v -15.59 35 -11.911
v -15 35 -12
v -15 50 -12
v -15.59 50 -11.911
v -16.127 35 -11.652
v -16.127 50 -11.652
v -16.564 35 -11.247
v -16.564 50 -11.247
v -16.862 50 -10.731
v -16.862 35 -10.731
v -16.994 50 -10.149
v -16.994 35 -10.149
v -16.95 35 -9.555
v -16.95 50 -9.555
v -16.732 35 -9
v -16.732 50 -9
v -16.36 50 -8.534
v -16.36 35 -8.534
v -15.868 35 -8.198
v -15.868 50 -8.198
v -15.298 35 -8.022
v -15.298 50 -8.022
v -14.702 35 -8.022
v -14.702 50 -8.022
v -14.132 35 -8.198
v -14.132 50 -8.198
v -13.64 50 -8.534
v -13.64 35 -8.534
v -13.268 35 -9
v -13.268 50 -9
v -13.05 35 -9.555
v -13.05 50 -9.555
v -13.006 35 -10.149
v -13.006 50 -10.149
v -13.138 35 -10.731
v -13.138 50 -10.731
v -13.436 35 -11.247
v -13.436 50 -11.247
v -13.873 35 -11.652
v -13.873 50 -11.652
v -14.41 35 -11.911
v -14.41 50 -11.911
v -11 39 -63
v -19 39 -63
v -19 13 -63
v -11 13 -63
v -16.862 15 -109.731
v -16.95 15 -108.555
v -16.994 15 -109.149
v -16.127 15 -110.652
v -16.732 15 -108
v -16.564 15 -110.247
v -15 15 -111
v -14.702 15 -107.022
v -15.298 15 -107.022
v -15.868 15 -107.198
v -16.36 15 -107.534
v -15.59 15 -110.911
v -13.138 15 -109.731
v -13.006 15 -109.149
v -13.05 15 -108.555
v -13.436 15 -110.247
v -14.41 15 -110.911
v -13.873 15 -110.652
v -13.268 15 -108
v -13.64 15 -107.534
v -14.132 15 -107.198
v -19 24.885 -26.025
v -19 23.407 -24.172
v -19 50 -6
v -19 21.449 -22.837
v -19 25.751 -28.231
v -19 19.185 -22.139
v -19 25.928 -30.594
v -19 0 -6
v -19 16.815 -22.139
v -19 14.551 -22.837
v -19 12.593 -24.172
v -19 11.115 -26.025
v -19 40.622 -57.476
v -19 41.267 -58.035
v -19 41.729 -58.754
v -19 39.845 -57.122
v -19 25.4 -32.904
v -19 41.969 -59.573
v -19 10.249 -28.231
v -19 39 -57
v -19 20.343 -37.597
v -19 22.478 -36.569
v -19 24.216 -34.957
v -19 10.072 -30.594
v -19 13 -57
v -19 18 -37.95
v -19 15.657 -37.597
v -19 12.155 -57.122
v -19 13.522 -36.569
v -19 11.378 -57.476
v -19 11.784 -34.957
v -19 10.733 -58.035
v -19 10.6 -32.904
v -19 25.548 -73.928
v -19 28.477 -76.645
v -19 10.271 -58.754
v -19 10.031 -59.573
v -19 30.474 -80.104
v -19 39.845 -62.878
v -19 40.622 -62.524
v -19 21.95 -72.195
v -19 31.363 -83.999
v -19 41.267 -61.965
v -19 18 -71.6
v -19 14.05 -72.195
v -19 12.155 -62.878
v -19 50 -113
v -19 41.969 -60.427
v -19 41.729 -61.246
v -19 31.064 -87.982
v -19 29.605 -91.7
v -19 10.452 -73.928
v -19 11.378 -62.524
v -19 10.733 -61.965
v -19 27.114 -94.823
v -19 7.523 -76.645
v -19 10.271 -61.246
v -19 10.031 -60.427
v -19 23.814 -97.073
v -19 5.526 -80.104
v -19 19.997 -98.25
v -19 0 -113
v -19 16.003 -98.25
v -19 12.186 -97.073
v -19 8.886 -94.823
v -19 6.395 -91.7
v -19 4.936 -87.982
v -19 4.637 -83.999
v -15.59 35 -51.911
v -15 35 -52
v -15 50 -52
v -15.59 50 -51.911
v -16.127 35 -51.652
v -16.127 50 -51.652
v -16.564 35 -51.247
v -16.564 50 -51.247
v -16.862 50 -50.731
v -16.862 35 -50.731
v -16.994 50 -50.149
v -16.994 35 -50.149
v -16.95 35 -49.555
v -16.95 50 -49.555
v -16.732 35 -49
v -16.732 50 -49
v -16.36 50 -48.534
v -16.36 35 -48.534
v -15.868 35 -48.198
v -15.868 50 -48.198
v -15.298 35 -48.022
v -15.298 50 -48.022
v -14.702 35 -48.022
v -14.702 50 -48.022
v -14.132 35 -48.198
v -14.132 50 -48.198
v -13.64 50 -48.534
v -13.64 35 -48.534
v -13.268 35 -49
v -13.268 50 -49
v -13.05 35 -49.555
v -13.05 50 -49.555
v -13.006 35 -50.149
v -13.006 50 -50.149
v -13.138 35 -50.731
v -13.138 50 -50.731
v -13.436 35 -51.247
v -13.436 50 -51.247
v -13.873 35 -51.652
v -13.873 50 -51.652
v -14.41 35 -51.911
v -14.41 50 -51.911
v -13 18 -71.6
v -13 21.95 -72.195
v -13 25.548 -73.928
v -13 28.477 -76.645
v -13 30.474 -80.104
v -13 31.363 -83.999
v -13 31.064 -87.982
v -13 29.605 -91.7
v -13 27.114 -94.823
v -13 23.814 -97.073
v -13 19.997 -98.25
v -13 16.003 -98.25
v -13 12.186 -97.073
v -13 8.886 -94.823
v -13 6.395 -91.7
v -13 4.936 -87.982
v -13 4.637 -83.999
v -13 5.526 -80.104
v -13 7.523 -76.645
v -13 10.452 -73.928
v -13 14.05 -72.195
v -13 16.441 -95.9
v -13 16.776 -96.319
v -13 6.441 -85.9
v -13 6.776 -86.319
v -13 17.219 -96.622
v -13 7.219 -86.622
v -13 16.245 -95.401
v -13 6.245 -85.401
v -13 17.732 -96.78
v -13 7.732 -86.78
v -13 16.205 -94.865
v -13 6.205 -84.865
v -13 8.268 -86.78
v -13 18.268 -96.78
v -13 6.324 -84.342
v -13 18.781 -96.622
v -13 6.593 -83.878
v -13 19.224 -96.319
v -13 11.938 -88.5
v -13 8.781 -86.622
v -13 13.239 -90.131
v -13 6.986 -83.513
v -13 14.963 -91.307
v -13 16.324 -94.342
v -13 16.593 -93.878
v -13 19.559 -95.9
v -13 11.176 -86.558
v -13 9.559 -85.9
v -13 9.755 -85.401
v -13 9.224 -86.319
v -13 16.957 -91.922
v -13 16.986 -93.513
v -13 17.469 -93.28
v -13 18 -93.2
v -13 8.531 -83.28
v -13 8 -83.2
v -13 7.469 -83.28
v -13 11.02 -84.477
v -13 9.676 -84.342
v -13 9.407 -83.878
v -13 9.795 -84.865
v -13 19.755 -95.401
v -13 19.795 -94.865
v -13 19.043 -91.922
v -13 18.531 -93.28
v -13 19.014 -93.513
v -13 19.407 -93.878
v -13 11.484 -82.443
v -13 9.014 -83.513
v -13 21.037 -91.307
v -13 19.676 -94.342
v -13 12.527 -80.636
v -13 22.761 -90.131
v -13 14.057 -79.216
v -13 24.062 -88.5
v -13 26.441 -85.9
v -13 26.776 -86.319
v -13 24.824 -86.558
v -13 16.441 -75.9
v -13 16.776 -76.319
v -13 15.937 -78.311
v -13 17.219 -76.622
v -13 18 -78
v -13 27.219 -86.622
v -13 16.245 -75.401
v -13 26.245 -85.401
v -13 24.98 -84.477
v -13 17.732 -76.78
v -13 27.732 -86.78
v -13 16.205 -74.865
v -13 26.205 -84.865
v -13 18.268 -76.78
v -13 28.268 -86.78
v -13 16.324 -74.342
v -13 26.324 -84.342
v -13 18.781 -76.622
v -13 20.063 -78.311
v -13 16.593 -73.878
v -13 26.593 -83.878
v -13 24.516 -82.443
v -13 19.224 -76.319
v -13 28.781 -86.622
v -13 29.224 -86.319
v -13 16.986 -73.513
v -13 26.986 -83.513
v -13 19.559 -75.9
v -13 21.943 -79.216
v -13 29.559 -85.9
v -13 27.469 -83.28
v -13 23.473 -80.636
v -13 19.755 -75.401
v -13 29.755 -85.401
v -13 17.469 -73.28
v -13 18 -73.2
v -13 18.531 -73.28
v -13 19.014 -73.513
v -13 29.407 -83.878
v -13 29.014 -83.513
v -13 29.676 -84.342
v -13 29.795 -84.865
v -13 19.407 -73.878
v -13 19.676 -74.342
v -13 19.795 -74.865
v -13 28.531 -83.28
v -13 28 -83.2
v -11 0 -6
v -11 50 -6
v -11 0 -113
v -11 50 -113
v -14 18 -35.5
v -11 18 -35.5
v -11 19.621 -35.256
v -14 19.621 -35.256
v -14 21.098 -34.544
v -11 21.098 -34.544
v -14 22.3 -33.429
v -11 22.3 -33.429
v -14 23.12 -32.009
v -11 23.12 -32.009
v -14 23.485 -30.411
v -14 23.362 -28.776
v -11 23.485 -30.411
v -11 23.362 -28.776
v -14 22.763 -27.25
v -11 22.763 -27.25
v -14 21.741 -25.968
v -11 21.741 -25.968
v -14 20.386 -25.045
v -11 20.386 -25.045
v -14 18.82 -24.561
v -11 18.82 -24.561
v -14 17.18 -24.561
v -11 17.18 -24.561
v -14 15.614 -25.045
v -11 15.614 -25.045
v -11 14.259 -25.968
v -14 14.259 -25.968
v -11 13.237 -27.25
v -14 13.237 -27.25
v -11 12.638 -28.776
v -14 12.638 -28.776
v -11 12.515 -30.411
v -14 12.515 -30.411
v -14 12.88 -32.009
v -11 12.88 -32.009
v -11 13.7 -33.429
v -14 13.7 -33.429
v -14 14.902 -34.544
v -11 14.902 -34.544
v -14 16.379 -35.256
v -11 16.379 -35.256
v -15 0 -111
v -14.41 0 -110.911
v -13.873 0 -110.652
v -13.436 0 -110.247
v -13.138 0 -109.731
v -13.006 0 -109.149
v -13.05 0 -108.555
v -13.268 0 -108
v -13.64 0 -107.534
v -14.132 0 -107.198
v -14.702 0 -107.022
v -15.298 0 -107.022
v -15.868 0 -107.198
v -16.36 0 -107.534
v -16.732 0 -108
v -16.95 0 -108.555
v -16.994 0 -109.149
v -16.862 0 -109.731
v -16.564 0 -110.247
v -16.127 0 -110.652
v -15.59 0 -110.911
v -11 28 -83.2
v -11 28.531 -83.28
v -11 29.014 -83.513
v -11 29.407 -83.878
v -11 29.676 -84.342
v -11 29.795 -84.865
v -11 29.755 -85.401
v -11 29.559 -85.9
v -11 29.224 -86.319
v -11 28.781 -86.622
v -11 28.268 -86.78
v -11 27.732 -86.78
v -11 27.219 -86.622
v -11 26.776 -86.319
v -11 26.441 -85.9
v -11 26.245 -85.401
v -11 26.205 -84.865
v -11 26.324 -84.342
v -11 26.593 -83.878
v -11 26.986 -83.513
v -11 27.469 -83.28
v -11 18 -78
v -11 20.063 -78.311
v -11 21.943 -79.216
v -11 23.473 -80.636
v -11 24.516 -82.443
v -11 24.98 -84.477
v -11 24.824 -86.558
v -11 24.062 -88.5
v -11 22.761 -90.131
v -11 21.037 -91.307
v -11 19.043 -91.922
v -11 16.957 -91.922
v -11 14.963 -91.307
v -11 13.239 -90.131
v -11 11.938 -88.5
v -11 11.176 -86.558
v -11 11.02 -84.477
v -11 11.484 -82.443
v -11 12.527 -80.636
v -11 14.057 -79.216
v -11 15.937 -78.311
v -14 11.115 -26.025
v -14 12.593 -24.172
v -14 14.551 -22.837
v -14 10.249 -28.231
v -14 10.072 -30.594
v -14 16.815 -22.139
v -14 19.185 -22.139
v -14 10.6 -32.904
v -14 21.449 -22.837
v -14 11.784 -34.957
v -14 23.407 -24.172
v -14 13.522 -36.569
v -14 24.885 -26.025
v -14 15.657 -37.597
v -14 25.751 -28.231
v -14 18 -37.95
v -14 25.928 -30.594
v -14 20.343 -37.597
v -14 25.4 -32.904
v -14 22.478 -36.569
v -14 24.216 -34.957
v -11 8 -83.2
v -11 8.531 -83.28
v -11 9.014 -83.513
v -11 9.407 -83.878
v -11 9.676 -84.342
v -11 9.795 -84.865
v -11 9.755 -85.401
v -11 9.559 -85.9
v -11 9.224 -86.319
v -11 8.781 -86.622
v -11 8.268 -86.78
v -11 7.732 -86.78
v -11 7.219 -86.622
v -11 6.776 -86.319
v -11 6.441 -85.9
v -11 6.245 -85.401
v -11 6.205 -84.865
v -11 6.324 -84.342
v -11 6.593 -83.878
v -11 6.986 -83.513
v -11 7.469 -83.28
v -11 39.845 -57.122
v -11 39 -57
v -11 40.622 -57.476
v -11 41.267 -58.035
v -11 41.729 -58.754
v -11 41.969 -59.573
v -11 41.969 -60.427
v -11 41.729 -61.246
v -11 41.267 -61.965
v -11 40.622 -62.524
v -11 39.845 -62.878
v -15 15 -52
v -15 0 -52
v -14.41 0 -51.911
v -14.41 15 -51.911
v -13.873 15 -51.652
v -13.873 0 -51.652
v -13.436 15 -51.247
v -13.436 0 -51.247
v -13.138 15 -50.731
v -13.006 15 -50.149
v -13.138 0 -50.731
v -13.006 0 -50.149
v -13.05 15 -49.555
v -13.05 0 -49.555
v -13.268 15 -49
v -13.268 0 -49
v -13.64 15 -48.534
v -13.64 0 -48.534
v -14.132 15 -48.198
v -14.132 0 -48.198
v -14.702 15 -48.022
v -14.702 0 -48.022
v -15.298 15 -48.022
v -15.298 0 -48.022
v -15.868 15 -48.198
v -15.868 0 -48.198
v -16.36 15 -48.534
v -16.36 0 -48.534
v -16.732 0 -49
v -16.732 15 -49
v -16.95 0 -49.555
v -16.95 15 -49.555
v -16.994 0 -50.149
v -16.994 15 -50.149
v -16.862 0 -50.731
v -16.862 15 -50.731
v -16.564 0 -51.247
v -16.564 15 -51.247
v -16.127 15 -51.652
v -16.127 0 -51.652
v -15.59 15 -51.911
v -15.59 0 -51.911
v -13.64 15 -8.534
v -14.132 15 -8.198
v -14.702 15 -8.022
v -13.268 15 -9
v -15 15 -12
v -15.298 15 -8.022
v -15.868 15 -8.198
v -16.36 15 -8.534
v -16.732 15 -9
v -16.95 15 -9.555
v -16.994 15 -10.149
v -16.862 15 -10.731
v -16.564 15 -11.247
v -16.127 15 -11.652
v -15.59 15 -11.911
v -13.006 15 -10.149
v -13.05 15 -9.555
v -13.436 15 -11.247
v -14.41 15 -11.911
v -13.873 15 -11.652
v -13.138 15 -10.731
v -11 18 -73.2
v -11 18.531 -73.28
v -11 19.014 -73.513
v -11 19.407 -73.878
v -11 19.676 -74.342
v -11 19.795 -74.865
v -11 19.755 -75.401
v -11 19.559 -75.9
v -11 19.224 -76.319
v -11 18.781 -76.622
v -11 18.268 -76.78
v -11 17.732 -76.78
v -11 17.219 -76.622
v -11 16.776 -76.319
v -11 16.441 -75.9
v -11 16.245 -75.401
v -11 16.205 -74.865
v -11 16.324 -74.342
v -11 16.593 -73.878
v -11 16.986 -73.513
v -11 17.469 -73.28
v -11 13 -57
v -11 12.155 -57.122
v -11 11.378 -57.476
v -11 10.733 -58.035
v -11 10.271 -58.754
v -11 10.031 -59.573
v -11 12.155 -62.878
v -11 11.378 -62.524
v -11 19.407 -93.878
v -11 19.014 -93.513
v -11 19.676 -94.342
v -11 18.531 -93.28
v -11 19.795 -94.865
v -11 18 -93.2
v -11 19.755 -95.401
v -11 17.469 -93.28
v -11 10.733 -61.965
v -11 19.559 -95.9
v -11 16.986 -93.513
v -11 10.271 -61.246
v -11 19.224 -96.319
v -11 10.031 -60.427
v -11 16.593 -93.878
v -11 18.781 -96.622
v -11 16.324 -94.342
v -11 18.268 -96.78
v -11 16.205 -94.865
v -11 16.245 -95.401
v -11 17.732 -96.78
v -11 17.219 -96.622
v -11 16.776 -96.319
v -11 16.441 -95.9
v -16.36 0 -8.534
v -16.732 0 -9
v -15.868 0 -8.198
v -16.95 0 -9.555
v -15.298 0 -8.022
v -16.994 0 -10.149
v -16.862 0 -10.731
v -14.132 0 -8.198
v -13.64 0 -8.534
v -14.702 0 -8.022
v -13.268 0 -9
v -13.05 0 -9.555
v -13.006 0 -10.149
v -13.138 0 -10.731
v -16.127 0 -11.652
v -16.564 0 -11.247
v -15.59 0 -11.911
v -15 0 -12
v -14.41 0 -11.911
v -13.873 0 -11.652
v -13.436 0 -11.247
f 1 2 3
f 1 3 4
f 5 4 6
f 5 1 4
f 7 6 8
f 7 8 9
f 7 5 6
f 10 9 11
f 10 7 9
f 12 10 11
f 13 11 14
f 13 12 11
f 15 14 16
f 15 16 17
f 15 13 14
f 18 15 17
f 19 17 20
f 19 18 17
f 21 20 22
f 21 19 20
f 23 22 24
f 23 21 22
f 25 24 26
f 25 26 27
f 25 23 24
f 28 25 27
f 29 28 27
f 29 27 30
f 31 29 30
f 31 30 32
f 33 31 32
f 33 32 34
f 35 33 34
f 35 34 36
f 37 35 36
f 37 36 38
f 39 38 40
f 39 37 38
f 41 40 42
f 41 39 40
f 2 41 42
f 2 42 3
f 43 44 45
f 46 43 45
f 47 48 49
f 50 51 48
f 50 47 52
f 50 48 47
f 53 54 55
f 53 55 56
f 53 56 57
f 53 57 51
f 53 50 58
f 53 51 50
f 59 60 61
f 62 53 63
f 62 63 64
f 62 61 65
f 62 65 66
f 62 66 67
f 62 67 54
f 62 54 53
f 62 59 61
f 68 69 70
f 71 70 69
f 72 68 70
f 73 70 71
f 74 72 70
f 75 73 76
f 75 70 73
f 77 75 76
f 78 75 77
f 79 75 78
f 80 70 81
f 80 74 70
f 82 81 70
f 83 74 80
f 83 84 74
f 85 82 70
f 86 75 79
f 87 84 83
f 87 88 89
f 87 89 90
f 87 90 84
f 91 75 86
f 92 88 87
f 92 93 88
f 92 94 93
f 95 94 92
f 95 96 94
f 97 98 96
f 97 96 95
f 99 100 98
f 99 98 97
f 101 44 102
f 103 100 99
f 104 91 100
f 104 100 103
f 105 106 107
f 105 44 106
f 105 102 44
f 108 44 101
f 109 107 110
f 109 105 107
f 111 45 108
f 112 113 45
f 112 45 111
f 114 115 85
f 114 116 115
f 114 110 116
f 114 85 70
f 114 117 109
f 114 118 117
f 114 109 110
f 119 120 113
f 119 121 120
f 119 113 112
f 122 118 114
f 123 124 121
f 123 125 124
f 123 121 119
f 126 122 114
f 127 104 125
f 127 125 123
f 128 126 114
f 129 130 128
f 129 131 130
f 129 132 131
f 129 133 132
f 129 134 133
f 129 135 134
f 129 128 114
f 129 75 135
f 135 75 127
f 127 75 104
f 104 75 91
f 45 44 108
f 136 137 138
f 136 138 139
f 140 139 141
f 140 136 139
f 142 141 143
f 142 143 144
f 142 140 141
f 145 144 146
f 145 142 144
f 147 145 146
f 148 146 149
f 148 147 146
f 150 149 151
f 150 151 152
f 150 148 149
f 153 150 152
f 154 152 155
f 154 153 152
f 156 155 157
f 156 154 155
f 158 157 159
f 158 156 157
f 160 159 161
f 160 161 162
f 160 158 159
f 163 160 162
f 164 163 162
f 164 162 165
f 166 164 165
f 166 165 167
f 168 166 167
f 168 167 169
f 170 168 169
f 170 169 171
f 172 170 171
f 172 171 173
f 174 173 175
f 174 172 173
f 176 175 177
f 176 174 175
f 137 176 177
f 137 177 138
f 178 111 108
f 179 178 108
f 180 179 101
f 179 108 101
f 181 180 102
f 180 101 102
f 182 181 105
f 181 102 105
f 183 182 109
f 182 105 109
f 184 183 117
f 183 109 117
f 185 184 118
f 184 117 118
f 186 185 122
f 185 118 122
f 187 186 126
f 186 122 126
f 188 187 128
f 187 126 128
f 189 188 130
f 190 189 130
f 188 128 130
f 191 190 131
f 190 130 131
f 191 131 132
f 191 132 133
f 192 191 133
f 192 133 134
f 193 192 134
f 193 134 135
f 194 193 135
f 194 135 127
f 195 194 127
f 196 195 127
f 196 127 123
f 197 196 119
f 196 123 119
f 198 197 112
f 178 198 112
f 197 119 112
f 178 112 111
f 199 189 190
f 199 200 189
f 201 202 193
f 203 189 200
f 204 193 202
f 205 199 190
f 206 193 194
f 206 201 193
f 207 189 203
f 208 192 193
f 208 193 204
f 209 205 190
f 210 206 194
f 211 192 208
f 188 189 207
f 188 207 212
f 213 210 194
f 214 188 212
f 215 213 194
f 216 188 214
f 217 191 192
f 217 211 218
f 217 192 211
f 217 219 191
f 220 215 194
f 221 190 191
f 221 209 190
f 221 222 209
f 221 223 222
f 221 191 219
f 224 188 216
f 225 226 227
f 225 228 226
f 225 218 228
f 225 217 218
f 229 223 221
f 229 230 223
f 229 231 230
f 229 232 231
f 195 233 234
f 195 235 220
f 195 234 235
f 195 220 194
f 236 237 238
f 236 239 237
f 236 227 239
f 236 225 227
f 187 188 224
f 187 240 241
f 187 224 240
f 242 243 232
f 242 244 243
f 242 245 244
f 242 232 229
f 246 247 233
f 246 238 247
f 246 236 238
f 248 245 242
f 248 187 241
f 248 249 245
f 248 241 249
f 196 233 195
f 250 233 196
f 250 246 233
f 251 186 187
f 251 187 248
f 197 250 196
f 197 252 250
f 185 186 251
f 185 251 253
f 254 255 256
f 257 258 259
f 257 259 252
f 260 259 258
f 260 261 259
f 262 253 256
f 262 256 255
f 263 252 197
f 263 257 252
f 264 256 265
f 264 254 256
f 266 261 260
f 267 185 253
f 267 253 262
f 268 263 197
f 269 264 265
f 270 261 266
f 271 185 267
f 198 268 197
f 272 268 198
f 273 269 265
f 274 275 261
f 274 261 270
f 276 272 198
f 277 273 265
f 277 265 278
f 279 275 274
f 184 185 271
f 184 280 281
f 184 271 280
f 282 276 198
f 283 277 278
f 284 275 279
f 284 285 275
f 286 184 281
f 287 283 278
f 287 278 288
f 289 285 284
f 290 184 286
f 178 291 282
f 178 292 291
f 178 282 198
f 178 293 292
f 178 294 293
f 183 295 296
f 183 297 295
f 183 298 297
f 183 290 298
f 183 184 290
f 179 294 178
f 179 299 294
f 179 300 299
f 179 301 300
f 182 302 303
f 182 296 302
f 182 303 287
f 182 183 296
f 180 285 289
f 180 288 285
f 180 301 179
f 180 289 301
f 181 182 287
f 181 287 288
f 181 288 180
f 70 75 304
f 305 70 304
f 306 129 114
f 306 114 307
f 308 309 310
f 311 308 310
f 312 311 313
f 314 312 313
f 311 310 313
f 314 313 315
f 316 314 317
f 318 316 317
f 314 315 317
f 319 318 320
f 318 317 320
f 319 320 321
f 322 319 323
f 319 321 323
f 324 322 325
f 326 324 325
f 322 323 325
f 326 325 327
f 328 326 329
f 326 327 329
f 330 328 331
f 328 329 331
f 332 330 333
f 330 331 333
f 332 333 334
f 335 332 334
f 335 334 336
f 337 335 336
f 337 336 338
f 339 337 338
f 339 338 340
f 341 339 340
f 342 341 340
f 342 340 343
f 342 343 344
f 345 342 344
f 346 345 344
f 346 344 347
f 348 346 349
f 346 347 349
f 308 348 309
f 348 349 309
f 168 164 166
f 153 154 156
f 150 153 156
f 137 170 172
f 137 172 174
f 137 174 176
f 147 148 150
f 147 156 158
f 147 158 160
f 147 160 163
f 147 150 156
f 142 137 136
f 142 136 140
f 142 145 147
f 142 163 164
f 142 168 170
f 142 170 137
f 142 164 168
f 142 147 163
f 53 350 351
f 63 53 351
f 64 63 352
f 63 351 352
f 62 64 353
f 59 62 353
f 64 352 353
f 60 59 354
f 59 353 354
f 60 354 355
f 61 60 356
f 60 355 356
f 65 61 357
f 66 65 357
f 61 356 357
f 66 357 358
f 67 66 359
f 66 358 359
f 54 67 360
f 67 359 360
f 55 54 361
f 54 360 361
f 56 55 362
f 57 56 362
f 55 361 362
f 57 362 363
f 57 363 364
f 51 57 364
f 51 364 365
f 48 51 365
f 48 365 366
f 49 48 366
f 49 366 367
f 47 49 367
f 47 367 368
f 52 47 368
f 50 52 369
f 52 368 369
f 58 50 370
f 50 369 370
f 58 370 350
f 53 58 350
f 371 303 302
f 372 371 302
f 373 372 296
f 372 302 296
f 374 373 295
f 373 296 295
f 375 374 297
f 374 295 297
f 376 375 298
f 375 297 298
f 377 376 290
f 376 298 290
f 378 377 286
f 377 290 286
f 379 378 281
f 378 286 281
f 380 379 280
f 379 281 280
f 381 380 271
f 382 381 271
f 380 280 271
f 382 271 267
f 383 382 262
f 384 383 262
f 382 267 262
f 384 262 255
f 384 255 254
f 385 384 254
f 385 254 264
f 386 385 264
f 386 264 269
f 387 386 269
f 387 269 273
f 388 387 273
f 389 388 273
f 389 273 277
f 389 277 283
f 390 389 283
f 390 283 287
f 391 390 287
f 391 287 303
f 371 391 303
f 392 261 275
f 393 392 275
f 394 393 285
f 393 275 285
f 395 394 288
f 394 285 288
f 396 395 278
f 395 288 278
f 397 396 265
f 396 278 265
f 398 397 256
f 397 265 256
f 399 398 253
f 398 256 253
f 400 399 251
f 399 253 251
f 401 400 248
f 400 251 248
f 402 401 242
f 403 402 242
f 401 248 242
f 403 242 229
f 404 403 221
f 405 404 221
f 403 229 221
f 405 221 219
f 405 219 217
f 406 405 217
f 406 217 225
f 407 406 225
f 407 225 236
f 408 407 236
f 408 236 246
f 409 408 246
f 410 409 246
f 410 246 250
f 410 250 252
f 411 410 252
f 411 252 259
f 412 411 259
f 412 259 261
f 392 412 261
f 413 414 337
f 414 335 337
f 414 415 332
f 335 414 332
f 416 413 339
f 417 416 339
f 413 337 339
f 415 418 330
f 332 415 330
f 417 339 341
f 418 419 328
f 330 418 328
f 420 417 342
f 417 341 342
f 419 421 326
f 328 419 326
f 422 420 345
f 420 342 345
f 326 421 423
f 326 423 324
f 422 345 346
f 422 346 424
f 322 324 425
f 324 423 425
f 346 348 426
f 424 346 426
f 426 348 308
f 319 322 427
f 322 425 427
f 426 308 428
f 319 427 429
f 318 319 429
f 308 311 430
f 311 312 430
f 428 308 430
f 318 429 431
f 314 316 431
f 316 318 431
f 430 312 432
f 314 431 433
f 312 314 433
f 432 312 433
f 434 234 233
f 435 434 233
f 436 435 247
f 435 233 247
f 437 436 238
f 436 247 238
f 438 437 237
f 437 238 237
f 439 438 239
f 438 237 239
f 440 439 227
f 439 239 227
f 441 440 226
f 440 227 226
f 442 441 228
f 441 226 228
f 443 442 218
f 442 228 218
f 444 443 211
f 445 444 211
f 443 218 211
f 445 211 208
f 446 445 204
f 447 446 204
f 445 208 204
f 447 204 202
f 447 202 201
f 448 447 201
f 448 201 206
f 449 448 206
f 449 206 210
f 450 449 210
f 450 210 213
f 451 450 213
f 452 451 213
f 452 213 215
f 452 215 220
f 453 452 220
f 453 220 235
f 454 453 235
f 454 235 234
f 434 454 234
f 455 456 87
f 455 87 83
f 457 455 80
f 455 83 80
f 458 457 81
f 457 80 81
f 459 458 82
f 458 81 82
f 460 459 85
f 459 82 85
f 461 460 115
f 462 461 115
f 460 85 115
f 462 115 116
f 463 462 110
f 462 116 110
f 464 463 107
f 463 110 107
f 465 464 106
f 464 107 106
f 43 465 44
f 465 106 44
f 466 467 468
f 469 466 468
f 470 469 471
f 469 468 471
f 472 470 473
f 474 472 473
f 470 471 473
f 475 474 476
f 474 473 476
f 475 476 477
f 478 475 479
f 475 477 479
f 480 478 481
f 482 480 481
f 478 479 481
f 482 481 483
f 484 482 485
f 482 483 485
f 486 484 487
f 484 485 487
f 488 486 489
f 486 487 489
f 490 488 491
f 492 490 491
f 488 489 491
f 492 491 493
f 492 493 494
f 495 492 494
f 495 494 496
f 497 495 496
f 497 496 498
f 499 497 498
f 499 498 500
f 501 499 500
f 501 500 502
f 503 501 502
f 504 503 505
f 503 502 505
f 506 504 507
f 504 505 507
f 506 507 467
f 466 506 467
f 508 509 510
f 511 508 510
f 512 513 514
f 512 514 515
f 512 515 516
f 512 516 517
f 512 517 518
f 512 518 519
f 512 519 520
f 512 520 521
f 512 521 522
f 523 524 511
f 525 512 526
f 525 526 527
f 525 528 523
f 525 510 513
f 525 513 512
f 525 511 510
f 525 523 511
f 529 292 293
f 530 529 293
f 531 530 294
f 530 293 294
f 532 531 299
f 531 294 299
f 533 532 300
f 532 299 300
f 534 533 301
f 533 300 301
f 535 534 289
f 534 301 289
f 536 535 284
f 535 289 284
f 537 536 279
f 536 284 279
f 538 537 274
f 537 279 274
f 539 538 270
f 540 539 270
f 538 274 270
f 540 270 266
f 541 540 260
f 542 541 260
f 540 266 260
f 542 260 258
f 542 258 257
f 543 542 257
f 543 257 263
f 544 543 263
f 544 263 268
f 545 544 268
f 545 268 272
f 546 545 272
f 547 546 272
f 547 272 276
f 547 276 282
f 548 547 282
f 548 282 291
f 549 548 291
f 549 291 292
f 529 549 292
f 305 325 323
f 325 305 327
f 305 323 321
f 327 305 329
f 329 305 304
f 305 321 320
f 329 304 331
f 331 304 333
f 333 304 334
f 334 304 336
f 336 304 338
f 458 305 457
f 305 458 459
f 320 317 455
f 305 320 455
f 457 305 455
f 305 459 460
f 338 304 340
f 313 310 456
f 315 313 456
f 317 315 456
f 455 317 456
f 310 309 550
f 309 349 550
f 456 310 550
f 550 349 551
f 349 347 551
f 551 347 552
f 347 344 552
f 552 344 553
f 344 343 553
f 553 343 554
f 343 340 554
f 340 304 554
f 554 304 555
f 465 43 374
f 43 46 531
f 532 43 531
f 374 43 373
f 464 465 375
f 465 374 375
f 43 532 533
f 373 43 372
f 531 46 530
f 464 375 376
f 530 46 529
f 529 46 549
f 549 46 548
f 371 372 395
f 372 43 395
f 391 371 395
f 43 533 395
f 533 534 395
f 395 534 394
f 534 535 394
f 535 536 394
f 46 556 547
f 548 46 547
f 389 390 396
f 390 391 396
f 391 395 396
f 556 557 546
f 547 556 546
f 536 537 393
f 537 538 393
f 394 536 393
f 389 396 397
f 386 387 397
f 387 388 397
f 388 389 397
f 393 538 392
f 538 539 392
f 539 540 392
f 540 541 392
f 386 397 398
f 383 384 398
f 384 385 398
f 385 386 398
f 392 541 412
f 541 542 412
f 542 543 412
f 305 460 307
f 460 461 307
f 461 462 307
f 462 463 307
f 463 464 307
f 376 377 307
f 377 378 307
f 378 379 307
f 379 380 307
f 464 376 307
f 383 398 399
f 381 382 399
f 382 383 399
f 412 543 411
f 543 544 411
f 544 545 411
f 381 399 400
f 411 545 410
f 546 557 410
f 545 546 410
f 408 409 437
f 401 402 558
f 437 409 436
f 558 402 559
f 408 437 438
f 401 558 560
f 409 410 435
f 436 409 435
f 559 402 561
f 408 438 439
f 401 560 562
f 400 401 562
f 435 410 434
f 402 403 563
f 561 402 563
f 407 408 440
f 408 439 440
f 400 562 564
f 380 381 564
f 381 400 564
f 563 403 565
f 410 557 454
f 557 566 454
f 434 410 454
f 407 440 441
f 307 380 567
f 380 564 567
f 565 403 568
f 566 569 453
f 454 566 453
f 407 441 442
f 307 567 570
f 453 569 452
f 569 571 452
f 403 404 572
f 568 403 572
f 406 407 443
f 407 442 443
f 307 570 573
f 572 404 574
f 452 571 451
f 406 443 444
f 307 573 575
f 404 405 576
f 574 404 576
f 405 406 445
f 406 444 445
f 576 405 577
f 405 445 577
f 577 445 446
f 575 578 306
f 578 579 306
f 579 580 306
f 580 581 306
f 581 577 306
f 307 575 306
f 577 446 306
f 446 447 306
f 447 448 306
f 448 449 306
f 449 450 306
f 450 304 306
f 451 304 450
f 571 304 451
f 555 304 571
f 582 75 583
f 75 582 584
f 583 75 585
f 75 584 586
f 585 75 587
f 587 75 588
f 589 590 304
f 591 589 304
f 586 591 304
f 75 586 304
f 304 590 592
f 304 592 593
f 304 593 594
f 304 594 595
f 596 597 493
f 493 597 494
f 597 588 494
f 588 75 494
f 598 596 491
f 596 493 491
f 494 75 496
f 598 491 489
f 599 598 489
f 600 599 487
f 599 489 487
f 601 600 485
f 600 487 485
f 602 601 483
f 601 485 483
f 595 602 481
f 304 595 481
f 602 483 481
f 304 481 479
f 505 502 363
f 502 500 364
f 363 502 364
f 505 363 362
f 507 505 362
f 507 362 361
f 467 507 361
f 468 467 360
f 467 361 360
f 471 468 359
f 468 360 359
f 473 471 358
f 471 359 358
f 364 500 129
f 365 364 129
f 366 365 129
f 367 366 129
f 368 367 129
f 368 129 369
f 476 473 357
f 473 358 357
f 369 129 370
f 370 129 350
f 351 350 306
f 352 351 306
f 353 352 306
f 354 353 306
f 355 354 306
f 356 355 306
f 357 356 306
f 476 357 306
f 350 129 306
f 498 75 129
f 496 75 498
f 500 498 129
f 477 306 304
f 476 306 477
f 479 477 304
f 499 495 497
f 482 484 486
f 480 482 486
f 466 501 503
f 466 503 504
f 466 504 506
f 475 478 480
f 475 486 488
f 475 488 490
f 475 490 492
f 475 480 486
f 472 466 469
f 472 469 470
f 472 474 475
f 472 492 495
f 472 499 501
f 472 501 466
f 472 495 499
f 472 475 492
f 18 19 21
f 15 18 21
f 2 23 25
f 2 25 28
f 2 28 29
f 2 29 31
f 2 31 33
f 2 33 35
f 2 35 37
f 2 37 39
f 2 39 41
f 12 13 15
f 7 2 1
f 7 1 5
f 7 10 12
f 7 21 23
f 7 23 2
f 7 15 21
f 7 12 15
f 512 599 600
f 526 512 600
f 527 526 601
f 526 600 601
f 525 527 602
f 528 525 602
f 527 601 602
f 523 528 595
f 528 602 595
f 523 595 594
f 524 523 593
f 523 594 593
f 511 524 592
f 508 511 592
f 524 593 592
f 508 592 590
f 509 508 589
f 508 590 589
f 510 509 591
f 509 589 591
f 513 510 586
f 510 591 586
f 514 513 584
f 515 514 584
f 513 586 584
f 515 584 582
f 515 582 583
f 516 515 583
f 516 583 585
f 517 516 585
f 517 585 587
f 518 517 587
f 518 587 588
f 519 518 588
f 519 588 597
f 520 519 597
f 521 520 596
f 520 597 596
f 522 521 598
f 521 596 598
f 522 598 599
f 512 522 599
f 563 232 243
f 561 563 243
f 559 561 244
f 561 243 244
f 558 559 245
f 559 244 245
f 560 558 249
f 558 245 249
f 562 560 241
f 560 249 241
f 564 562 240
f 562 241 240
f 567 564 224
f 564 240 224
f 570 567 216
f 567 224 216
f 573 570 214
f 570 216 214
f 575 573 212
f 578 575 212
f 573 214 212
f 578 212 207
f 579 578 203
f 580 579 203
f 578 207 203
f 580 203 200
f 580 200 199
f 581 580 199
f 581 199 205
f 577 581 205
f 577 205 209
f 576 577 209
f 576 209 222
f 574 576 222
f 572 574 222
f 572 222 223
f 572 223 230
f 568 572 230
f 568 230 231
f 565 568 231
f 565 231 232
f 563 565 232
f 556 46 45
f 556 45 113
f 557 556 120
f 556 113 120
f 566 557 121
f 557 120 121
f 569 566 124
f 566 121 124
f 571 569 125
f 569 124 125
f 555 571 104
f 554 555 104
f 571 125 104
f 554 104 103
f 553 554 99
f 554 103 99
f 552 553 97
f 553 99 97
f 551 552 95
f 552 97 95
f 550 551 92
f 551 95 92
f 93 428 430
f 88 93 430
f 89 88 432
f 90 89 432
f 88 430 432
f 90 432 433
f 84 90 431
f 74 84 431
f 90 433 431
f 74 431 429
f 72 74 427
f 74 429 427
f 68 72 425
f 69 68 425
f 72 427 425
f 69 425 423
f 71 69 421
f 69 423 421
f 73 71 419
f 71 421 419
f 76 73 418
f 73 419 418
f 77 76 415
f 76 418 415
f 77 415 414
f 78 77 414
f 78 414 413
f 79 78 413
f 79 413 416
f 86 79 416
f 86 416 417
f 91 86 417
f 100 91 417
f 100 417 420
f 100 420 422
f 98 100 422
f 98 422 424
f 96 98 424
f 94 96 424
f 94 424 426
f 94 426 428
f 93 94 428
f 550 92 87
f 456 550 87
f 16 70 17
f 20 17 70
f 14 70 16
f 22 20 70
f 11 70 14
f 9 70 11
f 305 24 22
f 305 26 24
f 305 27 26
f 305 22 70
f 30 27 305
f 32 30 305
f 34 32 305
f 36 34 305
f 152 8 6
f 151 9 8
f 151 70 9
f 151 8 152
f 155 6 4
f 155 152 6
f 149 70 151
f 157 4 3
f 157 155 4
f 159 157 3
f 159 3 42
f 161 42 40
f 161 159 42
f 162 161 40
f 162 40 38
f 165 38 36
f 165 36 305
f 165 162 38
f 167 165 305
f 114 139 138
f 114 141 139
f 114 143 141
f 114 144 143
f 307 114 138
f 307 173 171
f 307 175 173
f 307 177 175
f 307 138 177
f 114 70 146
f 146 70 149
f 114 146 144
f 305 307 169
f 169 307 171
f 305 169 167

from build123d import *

# Parameters (mm, degrees)
ESQUISSE1_W             = 8
ESQUISSE1_H             = 107
BOSS_EXTRU_1_DEPTH      = 50
ESQUISSE4_R             = 1.8
ENL_V_MAT_EXTRU_2_DEPTH = 10
ESQUISSE4_3_R           = 13.4
ESQUISSE4_3_R_2         = 1.8
ESQUISSE4_3_R_3         = 7
ENL_V_MAT_EXTRU_3_DEPTH = 6
ESQUISSE4_4_R           = 7
ENL_V_MAT_EXTRU_4_DEPTH = 10
ENL_V_MAT_EXTRU_5_DEPTH = 10
ESQUISSE26_R            = 7.95
ENL_V_MAT_EXTRU_6_DEPTH = 10
ESQUISSE24_R            = 8.2
ESQUISSE24_R_2          = 5.5
BOSS_EXTRU_6_DEPTH      = 3
ESQUISSE29_R            = 2
ENL_V_MAT_EXTRU_7_DEPTH = 15
ENL_V_START             = -15
ESQUISSE30_R            = 2
ENL_V_MAT_EXTRU_8_DEPTH = 15


with BuildPart() as part:
    # Esquisse1 → Boss.-Extru.1 (new body)
    with BuildSketch(Plane(origin=(0, 0, 0), x_dir=(1, 0, 0), z_dir=(0, 1, 0))):
        with Locations((-15, 59.5)):
            Rectangle(ESQUISSE1_W, ESQUISSE1_H)
    extrude(amount=BOSS_EXTRU_1_DEPTH)

    # Esquisse4 → Enlèv. mat.-Extru.2 (cut)
    with BuildSketch(Plane.ZY.offset(19)):
        with Locations((-85, 8)):
            Circle(ESQUISSE4_R)
        with Locations((-75, 18)):
            Circle(ESQUISSE4_R)
        with Locations((-85, 28)):
            Circle(ESQUISSE4_R)
        with Locations((-95, 18)):
            Circle(ESQUISSE4_R)
    extrude(amount=-ENL_V_MAT_EXTRU_2_DEPTH, mode=Mode.SUBTRACT)

    # Esquisse4<3> → Enlèv. mat.-Extru.3 (cut)
    with BuildSketch(Plane.ZY.offset(19)):
        with Locations((-85, 18)):
            Circle(ESQUISSE4_3_R)
        with Locations((-85, 8)):
            Circle(ESQUISSE4_3_R_2, mode=Mode.SUBTRACT)
        with Locations((-95, 18)):
            Circle(ESQUISSE4_3_R_2, mode=Mode.SUBTRACT)
        with Locations((-85, 18)):
            Circle(ESQUISSE4_3_R_3, mode=Mode.SUBTRACT)
        with Locations((-75, 18)):
            Circle(ESQUISSE4_3_R_2, mode=Mode.SUBTRACT)
        with Locations((-85, 28)):
            Circle(ESQUISSE4_3_R_2, mode=Mode.SUBTRACT)
    extrude(amount=-ENL_V_MAT_EXTRU_3_DEPTH, mode=Mode.SUBTRACT)

    # Esquisse4<4> → Enlèv. mat.-Extru.4 (cut)
    with BuildSketch(Plane.ZY.offset(19)):
        with Locations((-85, 18)):
            Circle(ESQUISSE4_4_R)
    extrude(amount=-ENL_V_MAT_EXTRU_4_DEPTH, mode=Mode.SUBTRACT)

    # Esquisse9 → Enlèv. mat.-Extru.5 (cut)
    with BuildSketch(Plane.ZY.offset(19)):
        with BuildLine():
            ThreePointArc((-57, 39), (-60, 42), (-63, 39))
            Line((-63, 39), (-63, 13))
            ThreePointArc((-63, 13), (-60, 10), (-57, 13))
            Line((-57, 13), (-57, 39))
        make_face()
    extrude(amount=-ENL_V_MAT_EXTRU_5_DEPTH, mode=Mode.SUBTRACT)

    # Esquisse26 → Enlèv. mat.-Extru.6 (cut)
    with BuildSketch(Plane(origin=(-11, 0, 0), x_dir=(0, 0, -1), z_dir=(1, 0, 0))):
        with Locations((30, 18)):
            Circle(ESQUISSE26_R)
    extrude(amount=-ENL_V_MAT_EXTRU_6_DEPTH, mode=Mode.SUBTRACT)

    # Esquisse24 → Boss.-Extru.6 (add)
    with BuildSketch(Plane(origin=(-11, 0, 0), x_dir=(0, 0, -1), z_dir=(1, 0, 0))):
        with Locations((30, 18)):
            Circle(ESQUISSE24_R)
        with Locations((30, 18)):
            Circle(ESQUISSE24_R_2, mode=Mode.SUBTRACT)
    extrude(amount=-BOSS_EXTRU_6_DEPTH)

    # Esquisse29 → Enlèv. mat.-Extru.7 (cut)
    with BuildSketch(Plane.XZ):
        with Locations((-15, -109)):
            Circle(ESQUISSE29_R)
        with Locations((-15, -10)):
            Circle(ESQUISSE29_R)
        with Locations((-15, -50)):
            Circle(ESQUISSE29_R)
    extrude(amount=-ENL_V_MAT_EXTRU_7_DEPTH, mode=Mode.SUBTRACT)

    # Esquisse30 → Enlèv. mat.-Extru.8 (cut)
    with BuildSketch(Plane(origin=(0, 50, 0), x_dir=(1, 0, 0), z_dir=(0, 1, 0)).offset(ENL_V_START)):
        with Locations((-15, 10)):
            Circle(ESQUISSE30_R)
        with Locations((-15, 50)):
            Circle(ESQUISSE30_R)
    extrude(amount=ENL_V_MAT_EXTRU_8_DEPTH, mode=Mode.SUBTRACT)


solid = part.part
